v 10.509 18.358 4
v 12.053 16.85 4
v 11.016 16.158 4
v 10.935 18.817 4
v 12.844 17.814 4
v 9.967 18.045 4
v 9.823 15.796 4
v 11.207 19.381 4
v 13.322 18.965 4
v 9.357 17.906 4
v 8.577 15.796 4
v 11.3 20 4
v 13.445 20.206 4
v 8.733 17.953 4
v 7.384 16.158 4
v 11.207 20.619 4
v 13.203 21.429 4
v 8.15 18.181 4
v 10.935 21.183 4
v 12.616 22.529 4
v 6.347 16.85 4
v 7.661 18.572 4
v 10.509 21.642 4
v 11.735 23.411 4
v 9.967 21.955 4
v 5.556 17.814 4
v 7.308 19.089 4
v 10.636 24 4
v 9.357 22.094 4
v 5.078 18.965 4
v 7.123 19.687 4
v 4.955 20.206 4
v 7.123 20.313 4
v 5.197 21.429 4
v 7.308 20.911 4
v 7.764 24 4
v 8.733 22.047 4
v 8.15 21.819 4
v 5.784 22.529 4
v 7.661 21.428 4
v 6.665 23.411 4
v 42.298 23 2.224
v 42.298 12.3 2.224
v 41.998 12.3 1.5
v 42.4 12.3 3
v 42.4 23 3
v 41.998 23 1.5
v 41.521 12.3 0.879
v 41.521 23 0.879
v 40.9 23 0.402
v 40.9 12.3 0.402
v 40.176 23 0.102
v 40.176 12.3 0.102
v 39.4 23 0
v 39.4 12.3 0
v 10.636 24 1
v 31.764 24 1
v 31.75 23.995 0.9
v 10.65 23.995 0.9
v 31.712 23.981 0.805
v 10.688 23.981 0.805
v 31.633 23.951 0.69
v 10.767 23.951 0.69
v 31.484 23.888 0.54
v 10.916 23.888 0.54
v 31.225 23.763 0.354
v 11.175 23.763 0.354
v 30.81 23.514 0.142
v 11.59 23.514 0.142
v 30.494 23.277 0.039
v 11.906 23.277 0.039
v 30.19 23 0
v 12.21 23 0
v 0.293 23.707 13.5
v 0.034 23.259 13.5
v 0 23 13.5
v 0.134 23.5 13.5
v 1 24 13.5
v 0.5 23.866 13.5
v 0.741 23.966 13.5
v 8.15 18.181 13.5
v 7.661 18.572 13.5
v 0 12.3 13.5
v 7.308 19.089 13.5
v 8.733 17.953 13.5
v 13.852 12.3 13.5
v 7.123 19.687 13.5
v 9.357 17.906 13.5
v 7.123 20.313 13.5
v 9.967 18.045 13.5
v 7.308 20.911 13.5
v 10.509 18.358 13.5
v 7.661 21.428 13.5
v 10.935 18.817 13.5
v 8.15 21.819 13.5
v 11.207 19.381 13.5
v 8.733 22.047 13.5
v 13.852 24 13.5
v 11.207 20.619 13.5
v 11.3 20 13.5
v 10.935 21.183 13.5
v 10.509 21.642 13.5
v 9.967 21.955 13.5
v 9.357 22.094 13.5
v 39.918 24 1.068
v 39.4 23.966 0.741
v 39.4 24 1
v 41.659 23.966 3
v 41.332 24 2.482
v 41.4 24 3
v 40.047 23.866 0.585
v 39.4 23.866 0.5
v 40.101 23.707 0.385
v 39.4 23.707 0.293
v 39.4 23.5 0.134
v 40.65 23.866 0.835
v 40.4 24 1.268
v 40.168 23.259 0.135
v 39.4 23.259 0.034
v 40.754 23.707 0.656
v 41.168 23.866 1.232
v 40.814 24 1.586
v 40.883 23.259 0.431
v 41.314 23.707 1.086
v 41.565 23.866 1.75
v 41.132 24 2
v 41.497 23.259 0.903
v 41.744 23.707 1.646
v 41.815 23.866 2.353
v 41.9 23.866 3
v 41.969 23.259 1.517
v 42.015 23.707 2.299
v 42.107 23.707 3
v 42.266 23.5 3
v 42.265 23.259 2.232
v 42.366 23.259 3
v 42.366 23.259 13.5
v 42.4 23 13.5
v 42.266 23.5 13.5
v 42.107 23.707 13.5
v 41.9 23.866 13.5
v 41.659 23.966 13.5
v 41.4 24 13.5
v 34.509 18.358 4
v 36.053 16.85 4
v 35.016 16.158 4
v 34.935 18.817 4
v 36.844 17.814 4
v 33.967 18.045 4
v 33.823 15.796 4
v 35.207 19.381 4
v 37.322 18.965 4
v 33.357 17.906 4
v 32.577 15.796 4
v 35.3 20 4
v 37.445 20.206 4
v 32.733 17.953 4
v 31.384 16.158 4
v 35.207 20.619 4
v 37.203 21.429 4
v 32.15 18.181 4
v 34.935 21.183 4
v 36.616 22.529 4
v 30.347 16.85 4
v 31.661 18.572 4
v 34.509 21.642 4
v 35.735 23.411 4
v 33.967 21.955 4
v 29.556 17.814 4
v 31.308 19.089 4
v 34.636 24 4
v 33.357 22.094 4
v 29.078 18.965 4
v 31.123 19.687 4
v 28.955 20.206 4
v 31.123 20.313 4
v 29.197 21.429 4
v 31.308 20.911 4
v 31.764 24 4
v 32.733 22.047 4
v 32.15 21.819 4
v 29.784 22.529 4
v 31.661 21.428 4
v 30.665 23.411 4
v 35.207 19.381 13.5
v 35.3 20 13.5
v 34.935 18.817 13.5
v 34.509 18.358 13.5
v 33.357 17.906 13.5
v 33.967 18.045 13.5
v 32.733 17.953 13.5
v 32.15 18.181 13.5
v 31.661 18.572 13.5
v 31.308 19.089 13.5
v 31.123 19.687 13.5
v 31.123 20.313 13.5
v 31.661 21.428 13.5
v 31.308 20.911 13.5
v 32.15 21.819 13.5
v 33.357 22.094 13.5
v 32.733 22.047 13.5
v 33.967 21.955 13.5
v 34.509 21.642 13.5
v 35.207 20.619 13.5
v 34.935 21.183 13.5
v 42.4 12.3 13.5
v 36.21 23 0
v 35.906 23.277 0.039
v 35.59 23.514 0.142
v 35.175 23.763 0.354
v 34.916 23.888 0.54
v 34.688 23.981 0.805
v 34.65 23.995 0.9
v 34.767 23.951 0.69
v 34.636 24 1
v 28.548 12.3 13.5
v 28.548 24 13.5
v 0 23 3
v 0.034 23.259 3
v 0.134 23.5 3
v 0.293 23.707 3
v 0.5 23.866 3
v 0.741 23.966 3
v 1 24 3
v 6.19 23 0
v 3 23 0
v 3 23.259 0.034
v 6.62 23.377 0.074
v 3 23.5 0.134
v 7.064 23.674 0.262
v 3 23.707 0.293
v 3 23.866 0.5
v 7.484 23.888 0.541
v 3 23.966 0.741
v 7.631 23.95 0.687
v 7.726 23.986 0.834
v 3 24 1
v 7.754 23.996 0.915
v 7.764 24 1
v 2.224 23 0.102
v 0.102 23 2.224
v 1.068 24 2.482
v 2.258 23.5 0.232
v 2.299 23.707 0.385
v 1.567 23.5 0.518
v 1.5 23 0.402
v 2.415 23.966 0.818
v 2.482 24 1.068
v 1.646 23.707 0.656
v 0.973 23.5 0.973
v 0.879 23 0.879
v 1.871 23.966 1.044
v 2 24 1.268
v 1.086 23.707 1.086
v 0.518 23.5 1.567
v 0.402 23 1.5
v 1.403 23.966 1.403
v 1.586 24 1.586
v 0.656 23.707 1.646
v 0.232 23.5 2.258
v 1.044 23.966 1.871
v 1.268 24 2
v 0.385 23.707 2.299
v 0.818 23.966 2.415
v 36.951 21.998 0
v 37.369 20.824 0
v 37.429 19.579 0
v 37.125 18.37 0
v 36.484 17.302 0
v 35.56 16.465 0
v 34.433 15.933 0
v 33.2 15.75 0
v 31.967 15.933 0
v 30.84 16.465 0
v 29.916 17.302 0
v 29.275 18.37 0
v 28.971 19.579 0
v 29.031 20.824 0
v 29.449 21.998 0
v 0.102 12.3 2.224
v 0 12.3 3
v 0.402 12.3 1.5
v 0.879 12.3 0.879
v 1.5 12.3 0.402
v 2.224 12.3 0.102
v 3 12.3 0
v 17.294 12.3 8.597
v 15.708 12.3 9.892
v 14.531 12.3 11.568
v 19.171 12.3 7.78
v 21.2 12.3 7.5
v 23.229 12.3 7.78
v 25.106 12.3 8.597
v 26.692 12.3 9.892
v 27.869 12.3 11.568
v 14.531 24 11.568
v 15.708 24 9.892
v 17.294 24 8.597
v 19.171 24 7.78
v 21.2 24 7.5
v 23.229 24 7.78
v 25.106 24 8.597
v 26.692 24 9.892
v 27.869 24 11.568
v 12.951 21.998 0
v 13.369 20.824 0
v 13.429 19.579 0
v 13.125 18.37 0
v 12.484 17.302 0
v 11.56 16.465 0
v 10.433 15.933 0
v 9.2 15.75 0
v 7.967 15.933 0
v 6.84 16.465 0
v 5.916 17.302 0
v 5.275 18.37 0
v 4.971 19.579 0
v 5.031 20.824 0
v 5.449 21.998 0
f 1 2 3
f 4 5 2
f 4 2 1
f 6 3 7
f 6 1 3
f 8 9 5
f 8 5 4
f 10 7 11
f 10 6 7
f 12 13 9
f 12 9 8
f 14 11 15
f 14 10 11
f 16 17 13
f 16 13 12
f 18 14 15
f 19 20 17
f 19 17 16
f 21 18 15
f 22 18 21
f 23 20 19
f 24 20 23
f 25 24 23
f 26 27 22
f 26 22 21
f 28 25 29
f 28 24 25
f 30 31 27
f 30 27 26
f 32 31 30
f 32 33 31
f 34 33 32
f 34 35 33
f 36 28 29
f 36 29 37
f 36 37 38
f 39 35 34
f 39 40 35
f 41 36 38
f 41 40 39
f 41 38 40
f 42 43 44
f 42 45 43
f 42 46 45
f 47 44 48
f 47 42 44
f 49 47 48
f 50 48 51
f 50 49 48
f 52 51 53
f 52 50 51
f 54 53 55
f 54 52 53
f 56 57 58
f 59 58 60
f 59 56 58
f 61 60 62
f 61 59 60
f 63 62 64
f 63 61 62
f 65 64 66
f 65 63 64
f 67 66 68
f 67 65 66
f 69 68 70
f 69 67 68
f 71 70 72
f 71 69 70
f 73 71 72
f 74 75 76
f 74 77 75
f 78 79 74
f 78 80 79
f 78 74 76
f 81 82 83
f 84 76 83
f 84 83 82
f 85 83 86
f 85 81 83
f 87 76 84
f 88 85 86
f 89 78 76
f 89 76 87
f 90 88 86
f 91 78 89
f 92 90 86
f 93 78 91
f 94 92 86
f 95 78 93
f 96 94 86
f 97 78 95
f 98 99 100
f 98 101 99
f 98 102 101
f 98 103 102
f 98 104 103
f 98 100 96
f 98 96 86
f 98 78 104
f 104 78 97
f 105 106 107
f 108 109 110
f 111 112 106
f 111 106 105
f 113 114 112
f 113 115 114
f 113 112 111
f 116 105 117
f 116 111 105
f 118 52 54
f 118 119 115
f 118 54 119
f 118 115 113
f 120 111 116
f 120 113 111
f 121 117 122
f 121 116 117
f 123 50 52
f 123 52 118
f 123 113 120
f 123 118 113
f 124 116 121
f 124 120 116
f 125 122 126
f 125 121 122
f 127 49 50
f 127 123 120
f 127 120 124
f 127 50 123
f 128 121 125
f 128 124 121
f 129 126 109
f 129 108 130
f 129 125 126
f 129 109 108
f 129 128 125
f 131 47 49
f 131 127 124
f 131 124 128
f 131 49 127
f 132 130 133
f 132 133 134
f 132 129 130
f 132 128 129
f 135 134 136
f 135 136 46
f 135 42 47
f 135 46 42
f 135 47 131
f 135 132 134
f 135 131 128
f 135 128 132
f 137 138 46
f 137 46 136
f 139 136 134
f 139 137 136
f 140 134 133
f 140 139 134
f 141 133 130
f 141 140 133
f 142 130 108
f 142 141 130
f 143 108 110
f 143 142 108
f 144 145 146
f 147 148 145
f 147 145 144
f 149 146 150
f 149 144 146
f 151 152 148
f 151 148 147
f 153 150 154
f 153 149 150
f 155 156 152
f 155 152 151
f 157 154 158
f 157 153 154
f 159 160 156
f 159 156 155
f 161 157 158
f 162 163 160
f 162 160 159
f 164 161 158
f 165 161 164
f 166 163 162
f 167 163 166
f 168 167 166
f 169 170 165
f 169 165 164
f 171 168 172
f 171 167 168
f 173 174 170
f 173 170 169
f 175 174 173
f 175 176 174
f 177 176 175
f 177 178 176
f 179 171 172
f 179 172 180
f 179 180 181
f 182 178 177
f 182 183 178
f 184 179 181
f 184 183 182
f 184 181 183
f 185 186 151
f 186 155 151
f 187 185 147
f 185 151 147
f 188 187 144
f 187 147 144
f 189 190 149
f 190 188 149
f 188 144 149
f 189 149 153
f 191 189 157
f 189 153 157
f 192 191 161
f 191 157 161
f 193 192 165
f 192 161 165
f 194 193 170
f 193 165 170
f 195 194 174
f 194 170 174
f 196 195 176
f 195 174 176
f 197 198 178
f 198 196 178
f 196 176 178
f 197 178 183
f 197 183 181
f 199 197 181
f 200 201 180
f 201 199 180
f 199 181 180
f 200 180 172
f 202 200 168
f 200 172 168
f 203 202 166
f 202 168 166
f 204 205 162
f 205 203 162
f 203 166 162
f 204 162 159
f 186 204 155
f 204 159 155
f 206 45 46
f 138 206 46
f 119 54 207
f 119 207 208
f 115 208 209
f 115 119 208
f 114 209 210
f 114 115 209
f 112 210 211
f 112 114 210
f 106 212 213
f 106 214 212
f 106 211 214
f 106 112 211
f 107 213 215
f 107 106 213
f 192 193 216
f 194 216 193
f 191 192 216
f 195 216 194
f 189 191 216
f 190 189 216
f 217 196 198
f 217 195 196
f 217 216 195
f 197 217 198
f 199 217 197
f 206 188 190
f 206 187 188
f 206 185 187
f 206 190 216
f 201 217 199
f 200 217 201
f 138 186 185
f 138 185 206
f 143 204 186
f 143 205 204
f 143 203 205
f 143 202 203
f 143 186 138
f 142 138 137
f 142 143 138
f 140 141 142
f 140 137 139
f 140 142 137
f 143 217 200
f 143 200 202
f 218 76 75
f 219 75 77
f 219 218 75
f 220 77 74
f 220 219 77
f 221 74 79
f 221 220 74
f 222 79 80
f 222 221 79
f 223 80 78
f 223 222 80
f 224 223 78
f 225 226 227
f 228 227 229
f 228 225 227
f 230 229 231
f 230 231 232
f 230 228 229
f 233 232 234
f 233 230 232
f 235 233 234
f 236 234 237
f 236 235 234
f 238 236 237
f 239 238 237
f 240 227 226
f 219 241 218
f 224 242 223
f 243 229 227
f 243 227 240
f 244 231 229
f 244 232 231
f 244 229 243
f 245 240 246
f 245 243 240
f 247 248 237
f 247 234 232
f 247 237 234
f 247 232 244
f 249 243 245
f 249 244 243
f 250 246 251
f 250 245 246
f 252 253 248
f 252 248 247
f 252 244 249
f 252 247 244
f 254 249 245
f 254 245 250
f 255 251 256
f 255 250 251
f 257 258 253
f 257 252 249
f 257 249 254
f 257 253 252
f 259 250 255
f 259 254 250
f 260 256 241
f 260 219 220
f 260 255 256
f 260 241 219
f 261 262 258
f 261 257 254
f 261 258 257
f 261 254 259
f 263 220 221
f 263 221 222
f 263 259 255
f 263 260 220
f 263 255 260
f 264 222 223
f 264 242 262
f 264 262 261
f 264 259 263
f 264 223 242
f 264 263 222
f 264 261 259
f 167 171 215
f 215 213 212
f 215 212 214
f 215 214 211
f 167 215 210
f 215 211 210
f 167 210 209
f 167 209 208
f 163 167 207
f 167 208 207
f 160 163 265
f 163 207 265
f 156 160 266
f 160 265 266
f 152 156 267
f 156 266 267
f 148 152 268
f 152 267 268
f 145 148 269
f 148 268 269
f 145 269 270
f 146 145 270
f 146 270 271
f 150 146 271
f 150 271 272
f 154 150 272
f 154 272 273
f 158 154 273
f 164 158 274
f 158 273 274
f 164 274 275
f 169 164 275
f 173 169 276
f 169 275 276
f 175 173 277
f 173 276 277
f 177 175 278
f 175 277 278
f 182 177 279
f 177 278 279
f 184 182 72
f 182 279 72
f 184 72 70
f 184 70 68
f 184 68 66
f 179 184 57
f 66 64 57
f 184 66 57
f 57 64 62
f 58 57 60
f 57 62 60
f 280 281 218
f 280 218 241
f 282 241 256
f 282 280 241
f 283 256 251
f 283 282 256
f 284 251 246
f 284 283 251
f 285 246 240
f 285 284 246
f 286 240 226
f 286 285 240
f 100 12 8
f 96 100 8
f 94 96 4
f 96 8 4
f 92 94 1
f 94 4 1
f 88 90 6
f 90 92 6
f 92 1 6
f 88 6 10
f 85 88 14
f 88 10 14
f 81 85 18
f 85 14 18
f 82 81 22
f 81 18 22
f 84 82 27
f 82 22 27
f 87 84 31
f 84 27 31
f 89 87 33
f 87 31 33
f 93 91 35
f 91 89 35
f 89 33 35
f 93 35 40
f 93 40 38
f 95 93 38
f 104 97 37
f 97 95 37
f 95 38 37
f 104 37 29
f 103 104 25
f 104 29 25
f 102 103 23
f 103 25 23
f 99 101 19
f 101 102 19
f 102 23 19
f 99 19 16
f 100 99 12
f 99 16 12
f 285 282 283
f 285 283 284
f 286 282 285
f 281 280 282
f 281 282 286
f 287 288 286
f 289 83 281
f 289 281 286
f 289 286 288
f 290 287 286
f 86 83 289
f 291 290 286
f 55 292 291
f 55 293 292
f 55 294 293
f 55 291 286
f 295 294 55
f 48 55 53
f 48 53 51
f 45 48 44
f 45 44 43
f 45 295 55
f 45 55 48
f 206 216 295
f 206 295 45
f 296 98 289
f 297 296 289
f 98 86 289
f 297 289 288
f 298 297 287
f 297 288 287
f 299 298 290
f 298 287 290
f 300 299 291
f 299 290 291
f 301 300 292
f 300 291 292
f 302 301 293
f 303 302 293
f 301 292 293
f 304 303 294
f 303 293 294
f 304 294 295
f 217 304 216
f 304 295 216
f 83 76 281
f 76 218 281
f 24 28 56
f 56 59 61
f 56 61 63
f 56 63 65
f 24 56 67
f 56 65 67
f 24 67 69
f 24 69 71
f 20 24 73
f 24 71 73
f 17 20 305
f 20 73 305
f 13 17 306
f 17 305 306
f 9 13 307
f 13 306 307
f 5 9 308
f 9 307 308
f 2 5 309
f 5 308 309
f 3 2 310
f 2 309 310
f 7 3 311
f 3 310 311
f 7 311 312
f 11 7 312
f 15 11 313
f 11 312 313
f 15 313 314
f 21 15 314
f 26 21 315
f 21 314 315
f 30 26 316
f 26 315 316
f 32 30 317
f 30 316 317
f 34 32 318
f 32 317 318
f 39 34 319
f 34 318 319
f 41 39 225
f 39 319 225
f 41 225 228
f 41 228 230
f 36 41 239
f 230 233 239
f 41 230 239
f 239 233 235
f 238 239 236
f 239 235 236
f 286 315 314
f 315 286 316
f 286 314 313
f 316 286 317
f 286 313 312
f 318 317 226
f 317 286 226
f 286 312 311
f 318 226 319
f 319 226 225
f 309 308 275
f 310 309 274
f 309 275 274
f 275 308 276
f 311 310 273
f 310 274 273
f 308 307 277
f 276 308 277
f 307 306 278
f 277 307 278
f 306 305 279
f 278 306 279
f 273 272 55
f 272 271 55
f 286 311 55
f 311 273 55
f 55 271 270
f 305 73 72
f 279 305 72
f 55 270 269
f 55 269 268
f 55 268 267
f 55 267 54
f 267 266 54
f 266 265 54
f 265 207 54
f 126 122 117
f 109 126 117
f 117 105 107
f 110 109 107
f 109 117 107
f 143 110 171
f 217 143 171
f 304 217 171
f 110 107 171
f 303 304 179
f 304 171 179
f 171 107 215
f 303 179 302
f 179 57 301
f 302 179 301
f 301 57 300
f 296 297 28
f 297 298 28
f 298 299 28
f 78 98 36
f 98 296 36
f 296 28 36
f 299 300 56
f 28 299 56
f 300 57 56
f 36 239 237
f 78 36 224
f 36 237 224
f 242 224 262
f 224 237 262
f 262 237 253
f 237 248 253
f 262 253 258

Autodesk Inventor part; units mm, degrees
ref_plane "YZ Plane" through (0, 0, 0) normal (1, 0, 0) x (0, 1, 0)
ref_plane "XZ Plane" through (0, 0, 0) normal (0, 1, 0) x (-1, 0, 0)
ref_plane "XY Plane" through (0, 0, 0) normal (0, 0, 1) x (1, 0, 0)
sketch "Sketch1" plane through (0, 0, 0) normal (0, 0, 1) x (1, 0, 0)
  line L0 (0, 0) -> (42.4, 0)
  line L1 (42.4, 0) -> (42.4, 24)
  line L2 (42.4, 24) -> (0, 24)
  line L3 (0, 24) -> (0, 0)
  circle A0 centre (9.2, 20) radius 2.1
  circle A1 centre (33.2, 20) radius 2.1
  circle A2 centre (33.2, 4) radius 2.1
  circle A3 centre (9.2, 4) radius 2.1
  dimension "d0" = 24
  dimension "d1" = 42.4
  dimension "d2" = 4.2
  dimension "d3" = 9.2
  dimension "d4" = 9.2
  dimension "d5" = 9.2
  dimension "d6" = 9.2
  dimension "d7" = 4
  dimension "d8" = 4
  dimension "d9" = 4
  dimension "d10" = 4
extrude "Extrusion1" add sketch "Sketch1" along normal blind 13.5
sketch "Sketch2" plane through (0, 0, 0) normal (0, -1, 0) x (1, 0, 0)
  line L0 (42.4, 13.5) -> (0, 13.5) projected
  line L1 (0, 0) -> (0, 13.5) projected
  circle A0 centre (21.2, 15) radius 7.5
  dimension "d13" = 15
  dimension "d14" = 21.2
  dimension "d15" = 1.5
extrude "Extrusion2" cut sketch "Sketch2" against normal through all
fillet "Fillet1" radius 3 3 edges at (42.4, 0, 6.75) (0, 0, 6.75) (21.2, 0, 0)
sketch "Sketch3" plane through (0, 0, 0) normal (0, 0, -1) x (-1, 0, 0)
  arc A0 (-31.3534, 3) -> (-35.0466, 3) centre (-33.2, 4) ccw projected
  arc A1 (-7.3534, 3) -> (-11.0466, 3) centre (-9.2, 4) ccw projected
  circle A2 centre (-33.2, 20) radius 2.1 projected
  circle A3 centre (-9.2, 20) radius 2.1 projected
  circle A4 centre (-33.2, 20) radius 4.25
  circle A5 centre (-9.2, 20) radius 4.25
  circle A6 centre (-9.2, 4) radius 4.25
  circle A7 centre (-33.2, 4) radius 4.25
  point P0 (0, 0)
  dimension "d20" = 8.5
extrude "Extrusion3" cut sketch "Sketch3" against normal blind 4
sketch "Sketch4" plane through (21.2, 0, 15) normal (0, -1, 0) x (1, 0, 0)
  line L0 (-26.3081, 1.9971) -> (24.247, 1.9971)
  line L1 (24.247, 1.9971) -> (24.247, -18.7305)
  line L2 (24.247, -18.7305) -> (-26.3081, -18.7305)
  line L3 (-26.3081, -18.7305) -> (-26.3081, 1.9971)
  point P0 (-21.2, -15)
extrude "Extrusion4" cut sketch "Sketch4" against normal blind 12.3
fillet "Fillet3" radius 3 2 edges at (42.4, 18.15, 0) (0, 18.15, 0)
fillet "Fillet4" radius 1 7 edges at (41.5213, 24, 0.8787) (37.0181, 24, 0) (42.4, 24, 8.25) (21.2, 24, 0) (0.8787, 24, 0.8787) (0, 24, 8.25) (5.3819, 24, 0)
properties part number "Z move clamp small"
